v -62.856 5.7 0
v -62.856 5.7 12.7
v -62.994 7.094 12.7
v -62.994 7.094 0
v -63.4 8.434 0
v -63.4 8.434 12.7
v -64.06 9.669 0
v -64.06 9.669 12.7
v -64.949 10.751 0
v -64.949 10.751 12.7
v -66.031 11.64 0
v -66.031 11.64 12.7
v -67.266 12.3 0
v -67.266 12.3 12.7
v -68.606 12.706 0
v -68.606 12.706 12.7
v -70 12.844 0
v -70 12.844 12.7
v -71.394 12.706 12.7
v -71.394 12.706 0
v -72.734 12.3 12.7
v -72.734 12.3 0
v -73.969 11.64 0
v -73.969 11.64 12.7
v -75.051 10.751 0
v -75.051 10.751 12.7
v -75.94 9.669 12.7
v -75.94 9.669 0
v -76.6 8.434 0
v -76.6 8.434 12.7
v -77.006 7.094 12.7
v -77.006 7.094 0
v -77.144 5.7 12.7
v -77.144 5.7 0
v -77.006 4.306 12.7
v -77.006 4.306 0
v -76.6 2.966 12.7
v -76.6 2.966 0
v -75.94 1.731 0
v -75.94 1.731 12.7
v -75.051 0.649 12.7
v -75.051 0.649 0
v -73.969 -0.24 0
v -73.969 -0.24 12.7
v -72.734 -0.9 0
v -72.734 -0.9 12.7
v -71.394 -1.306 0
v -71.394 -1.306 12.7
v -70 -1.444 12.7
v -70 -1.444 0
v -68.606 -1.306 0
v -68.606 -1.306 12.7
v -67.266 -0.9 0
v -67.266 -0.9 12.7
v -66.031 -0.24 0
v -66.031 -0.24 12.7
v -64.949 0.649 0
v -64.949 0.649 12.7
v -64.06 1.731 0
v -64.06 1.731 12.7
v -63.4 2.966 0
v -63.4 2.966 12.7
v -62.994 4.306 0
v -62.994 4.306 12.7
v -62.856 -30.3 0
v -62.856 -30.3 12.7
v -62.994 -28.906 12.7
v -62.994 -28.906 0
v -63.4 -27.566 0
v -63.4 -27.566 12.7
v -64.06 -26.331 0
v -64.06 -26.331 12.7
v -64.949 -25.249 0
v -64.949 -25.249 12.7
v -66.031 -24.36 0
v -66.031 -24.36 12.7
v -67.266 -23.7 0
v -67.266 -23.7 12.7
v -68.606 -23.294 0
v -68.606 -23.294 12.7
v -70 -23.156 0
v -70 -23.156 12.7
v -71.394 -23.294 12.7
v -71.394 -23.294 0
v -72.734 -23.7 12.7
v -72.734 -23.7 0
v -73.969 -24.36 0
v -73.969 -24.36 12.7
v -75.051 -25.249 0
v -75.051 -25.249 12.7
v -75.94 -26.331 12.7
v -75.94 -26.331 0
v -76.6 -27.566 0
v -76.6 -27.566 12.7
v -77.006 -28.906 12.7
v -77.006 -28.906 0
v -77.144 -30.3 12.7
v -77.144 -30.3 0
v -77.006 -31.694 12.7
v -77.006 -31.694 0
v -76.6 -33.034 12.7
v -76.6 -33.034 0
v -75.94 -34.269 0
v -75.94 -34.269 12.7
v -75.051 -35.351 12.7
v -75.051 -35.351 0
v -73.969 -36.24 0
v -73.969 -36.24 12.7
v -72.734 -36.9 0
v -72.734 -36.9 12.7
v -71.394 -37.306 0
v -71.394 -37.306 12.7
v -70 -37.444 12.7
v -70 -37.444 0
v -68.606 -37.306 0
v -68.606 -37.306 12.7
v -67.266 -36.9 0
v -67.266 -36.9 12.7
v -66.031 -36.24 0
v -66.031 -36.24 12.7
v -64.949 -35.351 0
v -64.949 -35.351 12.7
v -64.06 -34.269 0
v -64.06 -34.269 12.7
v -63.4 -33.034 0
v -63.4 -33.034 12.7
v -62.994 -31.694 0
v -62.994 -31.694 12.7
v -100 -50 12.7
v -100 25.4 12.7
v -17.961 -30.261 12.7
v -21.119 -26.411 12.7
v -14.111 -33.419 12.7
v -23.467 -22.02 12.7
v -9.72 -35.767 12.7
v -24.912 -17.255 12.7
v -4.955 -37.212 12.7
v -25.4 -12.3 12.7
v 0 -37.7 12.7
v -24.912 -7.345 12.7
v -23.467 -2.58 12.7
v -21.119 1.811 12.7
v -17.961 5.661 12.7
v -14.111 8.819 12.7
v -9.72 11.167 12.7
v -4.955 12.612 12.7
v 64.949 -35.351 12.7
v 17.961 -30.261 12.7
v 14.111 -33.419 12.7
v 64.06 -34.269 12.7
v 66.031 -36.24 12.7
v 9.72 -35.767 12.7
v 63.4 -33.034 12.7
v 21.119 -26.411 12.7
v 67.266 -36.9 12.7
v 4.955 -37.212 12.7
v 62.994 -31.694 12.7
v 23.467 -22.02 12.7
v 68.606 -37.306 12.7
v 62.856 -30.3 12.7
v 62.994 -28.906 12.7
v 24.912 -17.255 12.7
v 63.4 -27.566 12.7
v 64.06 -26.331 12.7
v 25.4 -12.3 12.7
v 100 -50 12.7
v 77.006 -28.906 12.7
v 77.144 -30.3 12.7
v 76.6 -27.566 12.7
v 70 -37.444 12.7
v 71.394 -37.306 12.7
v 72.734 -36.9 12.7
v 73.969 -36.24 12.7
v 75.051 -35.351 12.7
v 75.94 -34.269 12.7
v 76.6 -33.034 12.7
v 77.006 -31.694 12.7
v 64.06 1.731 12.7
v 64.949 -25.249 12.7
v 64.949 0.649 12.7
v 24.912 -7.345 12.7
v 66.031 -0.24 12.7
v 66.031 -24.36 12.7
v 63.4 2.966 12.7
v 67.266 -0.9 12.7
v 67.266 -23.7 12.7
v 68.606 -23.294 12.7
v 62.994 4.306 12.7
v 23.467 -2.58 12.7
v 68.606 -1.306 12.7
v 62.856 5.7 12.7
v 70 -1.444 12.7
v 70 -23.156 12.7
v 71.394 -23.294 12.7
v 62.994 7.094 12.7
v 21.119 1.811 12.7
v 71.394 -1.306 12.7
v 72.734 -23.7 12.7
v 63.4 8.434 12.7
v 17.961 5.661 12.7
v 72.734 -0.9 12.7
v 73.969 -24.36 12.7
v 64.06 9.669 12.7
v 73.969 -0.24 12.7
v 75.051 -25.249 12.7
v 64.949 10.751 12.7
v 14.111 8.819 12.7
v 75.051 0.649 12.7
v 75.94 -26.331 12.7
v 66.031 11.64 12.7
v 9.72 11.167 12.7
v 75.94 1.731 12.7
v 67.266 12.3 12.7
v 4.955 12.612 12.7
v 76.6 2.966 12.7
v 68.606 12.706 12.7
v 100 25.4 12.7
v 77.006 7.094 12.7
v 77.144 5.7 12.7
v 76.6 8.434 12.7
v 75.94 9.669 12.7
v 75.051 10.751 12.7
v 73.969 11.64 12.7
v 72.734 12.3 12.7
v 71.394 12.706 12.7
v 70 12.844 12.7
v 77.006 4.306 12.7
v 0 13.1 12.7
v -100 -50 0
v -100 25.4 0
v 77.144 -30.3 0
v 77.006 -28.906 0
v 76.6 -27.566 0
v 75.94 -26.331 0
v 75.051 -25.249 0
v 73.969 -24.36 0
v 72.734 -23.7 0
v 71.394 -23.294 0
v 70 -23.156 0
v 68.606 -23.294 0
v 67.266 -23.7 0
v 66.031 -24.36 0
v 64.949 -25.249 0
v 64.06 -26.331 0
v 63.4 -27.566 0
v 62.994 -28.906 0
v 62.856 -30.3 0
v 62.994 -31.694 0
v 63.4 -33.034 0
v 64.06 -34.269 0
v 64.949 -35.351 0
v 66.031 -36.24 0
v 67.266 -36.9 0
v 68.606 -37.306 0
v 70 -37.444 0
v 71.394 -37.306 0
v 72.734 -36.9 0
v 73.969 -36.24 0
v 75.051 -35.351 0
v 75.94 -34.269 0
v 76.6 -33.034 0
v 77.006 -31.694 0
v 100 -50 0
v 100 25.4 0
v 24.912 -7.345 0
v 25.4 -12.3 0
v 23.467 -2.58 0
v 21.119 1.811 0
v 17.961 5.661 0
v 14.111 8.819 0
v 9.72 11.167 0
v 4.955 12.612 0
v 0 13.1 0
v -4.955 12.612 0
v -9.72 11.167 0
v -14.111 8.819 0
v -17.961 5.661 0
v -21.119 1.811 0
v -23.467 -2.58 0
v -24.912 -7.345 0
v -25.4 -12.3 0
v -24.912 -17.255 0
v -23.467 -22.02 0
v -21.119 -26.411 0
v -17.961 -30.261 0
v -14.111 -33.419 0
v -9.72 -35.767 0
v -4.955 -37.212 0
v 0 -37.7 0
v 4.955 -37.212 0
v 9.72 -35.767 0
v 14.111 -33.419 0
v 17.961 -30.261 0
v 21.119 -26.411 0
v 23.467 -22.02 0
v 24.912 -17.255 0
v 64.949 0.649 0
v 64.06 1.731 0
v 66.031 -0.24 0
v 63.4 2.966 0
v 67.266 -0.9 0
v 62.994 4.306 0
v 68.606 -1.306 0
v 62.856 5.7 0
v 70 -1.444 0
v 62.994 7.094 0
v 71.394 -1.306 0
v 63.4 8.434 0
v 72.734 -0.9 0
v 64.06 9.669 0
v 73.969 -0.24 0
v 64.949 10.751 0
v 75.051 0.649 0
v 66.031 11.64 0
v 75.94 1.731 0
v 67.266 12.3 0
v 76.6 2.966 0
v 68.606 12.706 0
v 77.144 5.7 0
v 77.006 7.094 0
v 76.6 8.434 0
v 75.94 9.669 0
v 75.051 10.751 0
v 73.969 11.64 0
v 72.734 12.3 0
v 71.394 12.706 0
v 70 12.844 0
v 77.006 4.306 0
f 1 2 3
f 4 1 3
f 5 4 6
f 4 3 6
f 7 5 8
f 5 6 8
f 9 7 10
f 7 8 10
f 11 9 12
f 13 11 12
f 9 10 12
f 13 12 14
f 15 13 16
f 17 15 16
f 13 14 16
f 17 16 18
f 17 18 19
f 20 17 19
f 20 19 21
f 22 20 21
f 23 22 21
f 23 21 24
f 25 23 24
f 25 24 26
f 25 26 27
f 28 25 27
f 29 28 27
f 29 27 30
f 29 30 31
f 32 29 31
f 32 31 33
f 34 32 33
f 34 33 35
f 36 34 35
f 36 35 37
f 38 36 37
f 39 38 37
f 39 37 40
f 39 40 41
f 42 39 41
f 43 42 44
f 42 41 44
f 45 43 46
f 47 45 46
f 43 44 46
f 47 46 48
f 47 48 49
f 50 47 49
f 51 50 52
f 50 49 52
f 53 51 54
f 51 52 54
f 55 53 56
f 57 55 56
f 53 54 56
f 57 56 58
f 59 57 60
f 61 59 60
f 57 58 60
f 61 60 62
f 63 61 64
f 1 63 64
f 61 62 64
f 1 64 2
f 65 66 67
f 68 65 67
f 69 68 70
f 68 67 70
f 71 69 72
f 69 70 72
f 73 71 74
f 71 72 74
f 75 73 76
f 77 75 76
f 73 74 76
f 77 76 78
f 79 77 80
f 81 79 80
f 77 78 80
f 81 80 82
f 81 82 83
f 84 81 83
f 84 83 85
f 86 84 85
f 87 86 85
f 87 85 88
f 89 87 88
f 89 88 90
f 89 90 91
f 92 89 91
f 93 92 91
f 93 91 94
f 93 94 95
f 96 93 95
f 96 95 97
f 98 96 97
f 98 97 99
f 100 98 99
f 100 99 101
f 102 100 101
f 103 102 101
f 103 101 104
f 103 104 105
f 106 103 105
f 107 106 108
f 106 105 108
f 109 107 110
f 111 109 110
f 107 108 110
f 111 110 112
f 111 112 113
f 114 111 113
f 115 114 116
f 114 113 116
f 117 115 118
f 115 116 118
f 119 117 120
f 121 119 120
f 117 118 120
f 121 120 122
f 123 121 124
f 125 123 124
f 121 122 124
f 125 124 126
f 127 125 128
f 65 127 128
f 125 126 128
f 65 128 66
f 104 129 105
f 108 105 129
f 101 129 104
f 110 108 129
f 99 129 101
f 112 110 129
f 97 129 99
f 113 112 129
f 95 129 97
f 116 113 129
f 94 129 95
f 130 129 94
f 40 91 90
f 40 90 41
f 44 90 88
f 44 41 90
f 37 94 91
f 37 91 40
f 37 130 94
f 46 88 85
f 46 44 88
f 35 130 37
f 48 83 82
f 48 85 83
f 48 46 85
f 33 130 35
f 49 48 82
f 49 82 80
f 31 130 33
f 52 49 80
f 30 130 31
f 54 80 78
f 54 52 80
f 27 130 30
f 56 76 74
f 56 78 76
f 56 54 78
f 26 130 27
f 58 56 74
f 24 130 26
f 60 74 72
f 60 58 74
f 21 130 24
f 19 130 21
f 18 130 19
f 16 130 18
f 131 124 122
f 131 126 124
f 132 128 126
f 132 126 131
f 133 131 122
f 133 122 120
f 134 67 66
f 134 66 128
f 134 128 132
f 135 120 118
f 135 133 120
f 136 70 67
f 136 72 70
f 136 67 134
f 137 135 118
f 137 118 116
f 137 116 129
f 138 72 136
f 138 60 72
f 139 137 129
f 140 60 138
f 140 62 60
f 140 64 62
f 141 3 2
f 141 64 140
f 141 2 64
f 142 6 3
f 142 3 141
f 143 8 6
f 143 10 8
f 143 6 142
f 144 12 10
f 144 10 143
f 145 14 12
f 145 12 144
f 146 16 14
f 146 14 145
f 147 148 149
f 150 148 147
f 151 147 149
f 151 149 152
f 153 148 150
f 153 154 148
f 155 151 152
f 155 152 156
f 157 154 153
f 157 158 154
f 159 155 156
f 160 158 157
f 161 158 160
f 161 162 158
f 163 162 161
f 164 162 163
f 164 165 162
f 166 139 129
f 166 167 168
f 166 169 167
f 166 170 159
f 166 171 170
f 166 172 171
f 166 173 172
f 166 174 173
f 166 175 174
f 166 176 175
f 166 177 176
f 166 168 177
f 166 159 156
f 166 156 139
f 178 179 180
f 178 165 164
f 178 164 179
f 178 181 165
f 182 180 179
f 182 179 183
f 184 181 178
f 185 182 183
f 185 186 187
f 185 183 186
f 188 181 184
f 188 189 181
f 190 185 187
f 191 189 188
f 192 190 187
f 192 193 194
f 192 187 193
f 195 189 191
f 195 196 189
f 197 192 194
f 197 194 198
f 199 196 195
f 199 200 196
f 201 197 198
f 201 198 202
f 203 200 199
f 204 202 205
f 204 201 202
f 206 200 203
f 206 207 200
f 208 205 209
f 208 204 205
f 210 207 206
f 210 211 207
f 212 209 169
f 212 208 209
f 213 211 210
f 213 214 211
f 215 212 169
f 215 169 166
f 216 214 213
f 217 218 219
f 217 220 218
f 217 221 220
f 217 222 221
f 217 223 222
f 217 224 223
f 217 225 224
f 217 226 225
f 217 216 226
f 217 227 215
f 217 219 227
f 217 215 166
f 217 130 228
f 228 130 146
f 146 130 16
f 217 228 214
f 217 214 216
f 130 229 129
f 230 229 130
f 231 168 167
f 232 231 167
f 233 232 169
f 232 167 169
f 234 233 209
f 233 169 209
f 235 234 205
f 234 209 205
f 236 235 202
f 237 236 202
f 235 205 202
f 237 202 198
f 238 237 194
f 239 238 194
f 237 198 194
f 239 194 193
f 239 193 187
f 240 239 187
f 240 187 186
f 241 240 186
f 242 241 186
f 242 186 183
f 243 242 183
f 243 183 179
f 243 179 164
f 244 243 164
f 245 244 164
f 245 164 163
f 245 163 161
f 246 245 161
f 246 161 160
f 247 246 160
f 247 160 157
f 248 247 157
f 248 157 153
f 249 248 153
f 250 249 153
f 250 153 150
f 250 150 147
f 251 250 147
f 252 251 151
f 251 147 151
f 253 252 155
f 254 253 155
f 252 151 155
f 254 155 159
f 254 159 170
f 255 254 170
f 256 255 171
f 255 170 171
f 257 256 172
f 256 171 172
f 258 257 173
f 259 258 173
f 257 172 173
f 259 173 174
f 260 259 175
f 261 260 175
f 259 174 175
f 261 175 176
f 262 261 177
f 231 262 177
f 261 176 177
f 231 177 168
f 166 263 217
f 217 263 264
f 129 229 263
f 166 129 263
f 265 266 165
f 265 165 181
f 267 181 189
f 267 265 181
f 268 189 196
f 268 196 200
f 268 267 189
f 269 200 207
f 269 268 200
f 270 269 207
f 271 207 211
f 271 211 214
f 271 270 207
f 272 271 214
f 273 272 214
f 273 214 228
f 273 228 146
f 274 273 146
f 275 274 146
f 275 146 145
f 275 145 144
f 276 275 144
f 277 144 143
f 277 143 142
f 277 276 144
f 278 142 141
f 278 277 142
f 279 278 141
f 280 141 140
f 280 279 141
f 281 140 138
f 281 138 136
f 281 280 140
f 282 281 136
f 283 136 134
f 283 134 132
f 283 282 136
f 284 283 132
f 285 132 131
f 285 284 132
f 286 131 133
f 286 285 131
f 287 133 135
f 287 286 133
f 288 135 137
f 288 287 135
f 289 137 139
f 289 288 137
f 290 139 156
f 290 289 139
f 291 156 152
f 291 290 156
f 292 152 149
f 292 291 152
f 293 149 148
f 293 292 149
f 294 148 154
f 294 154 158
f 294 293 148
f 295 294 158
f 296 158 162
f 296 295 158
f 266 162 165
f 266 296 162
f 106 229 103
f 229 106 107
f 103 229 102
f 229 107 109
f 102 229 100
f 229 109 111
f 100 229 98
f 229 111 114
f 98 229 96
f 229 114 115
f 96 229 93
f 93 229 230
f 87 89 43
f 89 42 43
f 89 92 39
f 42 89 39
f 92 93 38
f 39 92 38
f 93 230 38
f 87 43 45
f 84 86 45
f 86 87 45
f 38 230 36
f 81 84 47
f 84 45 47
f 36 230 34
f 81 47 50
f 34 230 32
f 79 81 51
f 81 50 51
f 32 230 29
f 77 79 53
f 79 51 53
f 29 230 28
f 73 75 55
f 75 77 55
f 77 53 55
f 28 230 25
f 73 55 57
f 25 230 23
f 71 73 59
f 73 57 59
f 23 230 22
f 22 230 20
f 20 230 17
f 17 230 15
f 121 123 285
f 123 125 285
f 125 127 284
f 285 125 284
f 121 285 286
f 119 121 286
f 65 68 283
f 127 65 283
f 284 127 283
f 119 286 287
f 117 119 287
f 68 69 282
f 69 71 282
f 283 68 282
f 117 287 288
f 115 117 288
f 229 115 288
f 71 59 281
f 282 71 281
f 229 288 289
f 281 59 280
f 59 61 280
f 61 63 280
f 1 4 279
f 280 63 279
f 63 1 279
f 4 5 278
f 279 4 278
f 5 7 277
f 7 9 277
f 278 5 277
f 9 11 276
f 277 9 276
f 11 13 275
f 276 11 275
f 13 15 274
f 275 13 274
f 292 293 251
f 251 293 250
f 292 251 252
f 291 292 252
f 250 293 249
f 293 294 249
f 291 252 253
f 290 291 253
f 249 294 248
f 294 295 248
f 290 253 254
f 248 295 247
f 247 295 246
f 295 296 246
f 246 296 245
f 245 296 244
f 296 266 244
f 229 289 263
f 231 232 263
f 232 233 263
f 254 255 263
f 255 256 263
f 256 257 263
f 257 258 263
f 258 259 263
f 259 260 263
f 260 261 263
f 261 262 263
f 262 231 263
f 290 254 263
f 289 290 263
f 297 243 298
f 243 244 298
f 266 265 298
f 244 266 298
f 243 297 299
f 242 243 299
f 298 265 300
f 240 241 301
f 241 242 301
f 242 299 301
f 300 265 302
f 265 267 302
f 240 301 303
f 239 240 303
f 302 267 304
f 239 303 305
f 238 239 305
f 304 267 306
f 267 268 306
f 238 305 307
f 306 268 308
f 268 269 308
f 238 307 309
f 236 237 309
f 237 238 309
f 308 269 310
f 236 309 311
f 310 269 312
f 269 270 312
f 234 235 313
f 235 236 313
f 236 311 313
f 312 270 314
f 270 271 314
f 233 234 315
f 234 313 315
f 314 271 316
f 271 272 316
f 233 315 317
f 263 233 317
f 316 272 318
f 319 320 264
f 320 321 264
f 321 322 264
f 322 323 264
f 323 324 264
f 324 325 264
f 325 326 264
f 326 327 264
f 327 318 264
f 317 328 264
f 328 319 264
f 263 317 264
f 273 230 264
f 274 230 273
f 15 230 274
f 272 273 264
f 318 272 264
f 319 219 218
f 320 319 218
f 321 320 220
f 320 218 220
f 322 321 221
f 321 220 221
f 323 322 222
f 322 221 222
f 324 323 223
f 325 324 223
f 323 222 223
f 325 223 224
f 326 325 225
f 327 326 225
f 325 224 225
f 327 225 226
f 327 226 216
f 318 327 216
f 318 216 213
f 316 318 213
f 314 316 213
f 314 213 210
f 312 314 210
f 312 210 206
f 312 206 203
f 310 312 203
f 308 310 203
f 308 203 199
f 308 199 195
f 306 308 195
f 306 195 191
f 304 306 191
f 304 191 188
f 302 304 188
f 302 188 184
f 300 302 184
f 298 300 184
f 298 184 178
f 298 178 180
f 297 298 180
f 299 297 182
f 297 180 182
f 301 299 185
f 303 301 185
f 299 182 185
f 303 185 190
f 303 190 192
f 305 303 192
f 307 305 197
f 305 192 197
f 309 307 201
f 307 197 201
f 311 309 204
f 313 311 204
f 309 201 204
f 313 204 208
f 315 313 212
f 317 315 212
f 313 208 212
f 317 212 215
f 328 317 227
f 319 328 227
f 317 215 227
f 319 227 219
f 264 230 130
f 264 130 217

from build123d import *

# Parameters (mm, degrees)
CROQUIS1_W              = 200
CROQUIS1_H              = 75.4
CROQUIS1_R              = 25.4
SALIENTE_EXTRUIR1_DEPTH = 12.7
CROQUIS2_R              = 7.14375
CORTAR_EXTRUIR1_DEPTH   = 15


with BuildPart() as part:
    # Croquis1 → Saliente-Extruir1 (new body)
    with BuildSketch(Plane.XY):
        with Locations((0, -12.3)):
            Rectangle(CROQUIS1_W, CROQUIS1_H)
        with Locations((0, -12.3)):
            Circle(CROQUIS1_R, mode=Mode.SUBTRACT)
    extrude(amount=SALIENTE_EXTRUIR1_DEPTH)

    # Croquis2 → Cortar-Extruir1 (cut)
    with BuildSketch(Plane.XY.offset(12.7)):
        with Locations((-70, 5.7)):
            Circle(CROQUIS2_R)
        with Locations((-70, -30.3)):
            Circle(CROQUIS2_R)
        with Locations((70, -30.3)):
            Circle(CROQUIS2_R)
        with Locations((70, 5.7)):
            Circle(CROQUIS2_R)
    extrude(amount=-CORTAR_EXTRUIR1_DEPTH, mode=Mode.SUBTRACT)


solid = part.part
